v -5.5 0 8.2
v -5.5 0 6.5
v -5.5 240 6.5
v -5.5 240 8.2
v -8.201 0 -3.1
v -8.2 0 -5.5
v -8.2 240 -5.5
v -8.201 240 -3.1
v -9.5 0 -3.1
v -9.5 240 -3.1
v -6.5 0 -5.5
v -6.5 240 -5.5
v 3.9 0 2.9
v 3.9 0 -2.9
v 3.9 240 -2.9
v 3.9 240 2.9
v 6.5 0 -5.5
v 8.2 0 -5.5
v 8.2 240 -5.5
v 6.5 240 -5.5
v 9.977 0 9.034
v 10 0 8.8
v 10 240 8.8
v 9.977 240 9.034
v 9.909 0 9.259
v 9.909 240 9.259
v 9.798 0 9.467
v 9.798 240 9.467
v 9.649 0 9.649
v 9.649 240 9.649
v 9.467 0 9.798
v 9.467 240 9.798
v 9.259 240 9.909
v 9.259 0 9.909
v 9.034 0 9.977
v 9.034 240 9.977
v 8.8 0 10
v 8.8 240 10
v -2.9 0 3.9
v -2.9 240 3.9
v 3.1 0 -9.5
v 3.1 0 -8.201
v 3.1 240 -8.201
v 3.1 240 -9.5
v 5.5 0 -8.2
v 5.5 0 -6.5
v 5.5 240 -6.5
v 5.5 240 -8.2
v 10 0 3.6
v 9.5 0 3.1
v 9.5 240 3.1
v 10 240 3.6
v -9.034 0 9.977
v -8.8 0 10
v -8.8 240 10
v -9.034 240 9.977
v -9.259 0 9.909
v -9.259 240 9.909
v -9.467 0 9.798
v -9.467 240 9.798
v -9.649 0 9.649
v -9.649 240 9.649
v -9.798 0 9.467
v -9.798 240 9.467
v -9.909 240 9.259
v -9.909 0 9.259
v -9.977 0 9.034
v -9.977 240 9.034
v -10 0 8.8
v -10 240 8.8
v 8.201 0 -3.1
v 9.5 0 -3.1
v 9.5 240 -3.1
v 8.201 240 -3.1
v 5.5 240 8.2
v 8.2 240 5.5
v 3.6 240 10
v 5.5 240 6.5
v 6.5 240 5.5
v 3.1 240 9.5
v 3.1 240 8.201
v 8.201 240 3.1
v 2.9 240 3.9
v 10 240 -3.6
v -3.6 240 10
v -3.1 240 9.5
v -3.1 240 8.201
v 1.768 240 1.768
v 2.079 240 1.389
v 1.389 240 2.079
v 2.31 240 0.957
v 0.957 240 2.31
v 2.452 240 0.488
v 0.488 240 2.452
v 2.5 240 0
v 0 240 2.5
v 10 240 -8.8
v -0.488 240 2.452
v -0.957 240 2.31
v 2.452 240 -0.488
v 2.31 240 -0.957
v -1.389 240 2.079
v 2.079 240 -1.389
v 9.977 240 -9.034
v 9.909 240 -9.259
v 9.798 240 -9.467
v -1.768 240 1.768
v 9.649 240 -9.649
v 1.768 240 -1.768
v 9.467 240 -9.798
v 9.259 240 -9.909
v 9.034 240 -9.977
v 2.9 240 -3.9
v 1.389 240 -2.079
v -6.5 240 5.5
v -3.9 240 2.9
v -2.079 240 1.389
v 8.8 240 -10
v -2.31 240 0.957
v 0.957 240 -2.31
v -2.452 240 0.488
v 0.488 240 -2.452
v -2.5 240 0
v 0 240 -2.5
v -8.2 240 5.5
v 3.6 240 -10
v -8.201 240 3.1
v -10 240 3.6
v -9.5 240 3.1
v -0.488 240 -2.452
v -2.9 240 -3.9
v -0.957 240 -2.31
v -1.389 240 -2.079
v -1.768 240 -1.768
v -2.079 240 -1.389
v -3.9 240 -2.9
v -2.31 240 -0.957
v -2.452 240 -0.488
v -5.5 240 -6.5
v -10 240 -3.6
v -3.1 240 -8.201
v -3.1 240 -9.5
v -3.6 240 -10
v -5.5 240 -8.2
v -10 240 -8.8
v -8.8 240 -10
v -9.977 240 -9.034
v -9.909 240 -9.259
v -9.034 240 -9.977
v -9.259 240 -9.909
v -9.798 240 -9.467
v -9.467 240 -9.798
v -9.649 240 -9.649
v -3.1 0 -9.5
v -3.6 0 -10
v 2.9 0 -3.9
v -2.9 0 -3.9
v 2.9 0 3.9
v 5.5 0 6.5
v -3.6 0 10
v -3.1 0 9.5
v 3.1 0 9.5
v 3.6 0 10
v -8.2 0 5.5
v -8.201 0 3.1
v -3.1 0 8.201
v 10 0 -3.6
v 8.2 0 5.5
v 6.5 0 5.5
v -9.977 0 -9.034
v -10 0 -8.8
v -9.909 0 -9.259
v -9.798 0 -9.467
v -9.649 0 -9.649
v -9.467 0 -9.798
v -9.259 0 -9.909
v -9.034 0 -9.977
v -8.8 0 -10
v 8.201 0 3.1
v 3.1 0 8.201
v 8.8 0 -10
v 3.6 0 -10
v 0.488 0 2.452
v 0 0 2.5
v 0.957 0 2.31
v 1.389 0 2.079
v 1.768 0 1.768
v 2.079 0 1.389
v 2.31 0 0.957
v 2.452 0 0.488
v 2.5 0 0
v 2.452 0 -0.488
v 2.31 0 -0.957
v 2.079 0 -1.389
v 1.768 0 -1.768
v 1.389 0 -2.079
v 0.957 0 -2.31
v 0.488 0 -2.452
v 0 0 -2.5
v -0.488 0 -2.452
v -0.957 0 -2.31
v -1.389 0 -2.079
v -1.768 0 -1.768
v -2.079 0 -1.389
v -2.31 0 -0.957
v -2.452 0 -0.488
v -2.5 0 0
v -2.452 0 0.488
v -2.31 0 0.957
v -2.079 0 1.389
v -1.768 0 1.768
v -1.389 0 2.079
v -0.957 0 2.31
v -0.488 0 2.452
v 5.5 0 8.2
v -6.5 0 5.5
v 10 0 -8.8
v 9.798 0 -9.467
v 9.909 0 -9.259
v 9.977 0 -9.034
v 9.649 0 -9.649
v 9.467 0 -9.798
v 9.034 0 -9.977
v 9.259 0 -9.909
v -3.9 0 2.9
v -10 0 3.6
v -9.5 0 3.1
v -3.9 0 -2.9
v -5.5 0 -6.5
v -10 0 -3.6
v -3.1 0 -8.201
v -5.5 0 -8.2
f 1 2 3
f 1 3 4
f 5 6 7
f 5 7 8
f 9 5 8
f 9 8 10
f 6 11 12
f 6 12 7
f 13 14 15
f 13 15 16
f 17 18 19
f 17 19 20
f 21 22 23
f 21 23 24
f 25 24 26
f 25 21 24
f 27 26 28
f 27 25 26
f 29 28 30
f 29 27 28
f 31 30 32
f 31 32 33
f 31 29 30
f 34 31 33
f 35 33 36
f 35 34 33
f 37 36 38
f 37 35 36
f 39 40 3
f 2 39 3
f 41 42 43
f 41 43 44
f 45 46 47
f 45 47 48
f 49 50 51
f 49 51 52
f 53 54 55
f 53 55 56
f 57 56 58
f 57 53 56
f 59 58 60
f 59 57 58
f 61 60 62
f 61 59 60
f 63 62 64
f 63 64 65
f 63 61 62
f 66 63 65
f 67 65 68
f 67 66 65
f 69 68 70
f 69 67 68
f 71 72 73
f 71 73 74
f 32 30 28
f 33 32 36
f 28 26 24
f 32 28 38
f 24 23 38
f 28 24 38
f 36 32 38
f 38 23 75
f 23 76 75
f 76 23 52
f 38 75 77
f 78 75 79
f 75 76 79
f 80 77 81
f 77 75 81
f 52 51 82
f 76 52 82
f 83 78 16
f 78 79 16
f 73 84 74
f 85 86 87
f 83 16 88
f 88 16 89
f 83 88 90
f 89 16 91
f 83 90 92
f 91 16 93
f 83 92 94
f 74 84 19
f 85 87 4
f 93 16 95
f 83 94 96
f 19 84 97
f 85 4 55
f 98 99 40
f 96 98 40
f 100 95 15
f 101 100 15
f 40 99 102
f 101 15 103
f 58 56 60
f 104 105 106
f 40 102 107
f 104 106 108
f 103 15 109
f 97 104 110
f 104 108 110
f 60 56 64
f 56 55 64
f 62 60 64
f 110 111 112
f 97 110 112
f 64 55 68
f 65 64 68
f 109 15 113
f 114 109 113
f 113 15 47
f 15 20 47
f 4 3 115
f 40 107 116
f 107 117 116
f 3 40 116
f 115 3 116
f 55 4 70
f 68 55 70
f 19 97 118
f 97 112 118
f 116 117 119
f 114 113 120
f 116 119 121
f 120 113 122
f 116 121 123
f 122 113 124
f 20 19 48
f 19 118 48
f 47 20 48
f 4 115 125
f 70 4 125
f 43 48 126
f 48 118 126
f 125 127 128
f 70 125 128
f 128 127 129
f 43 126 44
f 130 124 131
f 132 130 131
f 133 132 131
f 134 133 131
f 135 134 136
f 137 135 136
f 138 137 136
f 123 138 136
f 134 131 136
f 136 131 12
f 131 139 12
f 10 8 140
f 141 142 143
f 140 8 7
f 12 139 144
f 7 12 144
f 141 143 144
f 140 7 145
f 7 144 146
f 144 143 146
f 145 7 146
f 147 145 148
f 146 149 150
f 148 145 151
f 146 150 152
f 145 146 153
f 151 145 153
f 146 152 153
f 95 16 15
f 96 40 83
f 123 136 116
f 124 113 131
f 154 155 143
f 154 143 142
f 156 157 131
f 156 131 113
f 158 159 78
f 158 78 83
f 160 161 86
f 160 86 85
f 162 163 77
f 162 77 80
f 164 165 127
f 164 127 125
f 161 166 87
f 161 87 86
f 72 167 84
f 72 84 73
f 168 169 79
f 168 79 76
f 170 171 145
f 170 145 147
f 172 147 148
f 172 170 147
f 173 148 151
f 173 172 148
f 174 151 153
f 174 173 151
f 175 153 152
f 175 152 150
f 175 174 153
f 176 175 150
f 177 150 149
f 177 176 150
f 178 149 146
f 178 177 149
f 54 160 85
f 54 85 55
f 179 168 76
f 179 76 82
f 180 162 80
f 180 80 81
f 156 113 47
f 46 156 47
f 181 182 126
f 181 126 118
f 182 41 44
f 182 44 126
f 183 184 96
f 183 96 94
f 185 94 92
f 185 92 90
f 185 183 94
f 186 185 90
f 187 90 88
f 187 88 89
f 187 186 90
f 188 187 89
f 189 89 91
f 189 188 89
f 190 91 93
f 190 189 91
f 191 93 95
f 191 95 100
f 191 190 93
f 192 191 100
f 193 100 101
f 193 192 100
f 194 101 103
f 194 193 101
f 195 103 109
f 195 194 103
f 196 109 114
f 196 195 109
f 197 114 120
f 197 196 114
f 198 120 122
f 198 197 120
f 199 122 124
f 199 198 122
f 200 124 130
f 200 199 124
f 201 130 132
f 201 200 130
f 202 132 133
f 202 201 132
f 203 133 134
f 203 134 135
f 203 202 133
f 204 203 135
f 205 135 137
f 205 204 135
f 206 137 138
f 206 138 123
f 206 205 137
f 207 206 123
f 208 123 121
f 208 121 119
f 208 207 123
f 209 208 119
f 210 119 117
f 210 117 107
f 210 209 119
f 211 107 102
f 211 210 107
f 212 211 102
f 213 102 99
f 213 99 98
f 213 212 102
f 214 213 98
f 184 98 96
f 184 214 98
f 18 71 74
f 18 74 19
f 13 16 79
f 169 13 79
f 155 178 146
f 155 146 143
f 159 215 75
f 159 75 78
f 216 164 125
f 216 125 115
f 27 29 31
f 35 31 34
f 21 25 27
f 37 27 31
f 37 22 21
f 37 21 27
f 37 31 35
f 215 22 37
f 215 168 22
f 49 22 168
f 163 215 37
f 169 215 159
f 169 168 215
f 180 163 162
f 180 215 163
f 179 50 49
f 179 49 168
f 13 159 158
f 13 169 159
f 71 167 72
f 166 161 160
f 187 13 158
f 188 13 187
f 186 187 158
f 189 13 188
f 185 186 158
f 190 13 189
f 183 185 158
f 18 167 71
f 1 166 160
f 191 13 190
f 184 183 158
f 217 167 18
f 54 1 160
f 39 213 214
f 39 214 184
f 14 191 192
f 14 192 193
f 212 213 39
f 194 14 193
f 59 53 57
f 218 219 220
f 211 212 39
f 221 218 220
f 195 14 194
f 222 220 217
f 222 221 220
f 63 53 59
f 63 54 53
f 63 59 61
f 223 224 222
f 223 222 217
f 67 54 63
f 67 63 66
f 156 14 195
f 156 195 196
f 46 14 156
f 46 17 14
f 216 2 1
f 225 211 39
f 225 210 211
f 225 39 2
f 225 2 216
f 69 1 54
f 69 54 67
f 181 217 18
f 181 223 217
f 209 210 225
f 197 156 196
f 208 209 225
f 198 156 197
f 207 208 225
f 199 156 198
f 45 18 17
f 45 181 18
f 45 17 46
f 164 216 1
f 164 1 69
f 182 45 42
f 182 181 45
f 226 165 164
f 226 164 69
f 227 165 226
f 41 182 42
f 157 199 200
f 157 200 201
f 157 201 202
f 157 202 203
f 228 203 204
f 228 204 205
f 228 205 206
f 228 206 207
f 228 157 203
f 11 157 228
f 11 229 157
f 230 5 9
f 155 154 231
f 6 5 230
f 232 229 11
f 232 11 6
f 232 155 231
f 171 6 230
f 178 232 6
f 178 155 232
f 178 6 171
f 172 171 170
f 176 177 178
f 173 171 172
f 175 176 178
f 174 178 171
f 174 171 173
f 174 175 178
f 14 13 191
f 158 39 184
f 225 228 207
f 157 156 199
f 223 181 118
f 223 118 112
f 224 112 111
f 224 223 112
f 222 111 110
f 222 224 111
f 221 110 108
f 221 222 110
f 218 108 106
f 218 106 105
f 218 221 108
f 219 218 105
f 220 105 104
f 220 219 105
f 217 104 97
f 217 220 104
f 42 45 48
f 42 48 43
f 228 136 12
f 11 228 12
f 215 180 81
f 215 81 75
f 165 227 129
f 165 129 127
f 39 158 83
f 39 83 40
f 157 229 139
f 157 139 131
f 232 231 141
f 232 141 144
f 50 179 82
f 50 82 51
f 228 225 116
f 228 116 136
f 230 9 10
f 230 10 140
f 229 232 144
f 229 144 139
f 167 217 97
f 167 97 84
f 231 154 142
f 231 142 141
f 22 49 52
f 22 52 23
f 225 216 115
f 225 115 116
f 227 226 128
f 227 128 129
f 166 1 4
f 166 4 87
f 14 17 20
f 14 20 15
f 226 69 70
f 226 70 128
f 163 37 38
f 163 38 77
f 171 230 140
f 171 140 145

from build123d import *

# Parameters (mm, degrees)
SKETCH_1_R      = 2.5
EXTRUDE_1_DEPTH = 240


with BuildPart() as part:
    # 草图1 → 凸台-拉伸1 (new body)
    with BuildSketch(Plane(origin=(0, 0, 0), x_dir=(1, 0, 0), z_dir=(0, 1, 0))):
        with BuildLine():
            Line((5.5, 8.2), (3.1, 8.201478584))
            Line((3.1, 8.201478584), (3.1, 9.5))
            Line((3.1, 9.5), (3.6, 10))
            Line((3.6, 10), (8.8, 10))
            ThreePointArc((8.8, 10), (9.648528137, 9.648528137), (10, 8.8))
            Line((10, 8.8), (10, 3.6))
            Line((10, 3.6), (9.5, 3.1))
            Line((9.5, 3.1), (8.201478584, 3.1))
            Line((8.201478584, 3.1), (8.2, 5.5))
            Line((8.2, 5.5), (6.5, 5.5))
            Line((6.5, 5.5), (3.9, 2.9))
            Line((3.9, 2.9), (3.9, -2.9))
            Line((3.9, -2.9), (6.5, -5.5))
            Line((6.5, -5.5), (8.2, -5.5))
            Line((8.2, -5.5), (8.201478584, -3.1))
            Line((8.201478584, -3.1), (9.5, -3.1))
            Line((9.5, -3.1), (10, -3.6))
            Line((10, -3.6), (10, -8.8))
            ThreePointArc((10, -8.8), (9.648528137, -9.648528137), (8.8, -10))
            Line((8.8, -10), (3.6, -10))
            Line((3.6, -10), (3.1, -9.5))
            Line((3.1, -9.5), (3.1, -8.201478584))
            Line((3.1, -8.201478584), (5.5, -8.2))
            Line((5.5, -8.2), (5.5, -6.5))
            Line((5.5, -6.5), (2.9, -3.9))
            Line((2.9, -3.9), (-2.9, -3.9))
            Line((-2.9, -3.9), (-5.5, -6.5))
            Line((-5.5, -6.5), (-5.5, -8.2))
            Line((-5.5, -8.2), (-3.1, -8.201478584))
            Line((-3.1, -8.201478584), (-3.1, -9.5))
            Line((-3.1, -9.5), (-3.6, -10))
            Line((-3.6, -10), (-8.8, -10))
            ThreePointArc((-8.8, -10), (-9.648528137, -9.648528137), (-10, -8.8))
            Line((-10, -8.8), (-10, -3.6))
            Line((-10, -3.6), (-9.5, -3.1))
            Line((-9.5, -3.1), (-8.201478584, -3.1))
            Line((-8.201478584, -3.1), (-8.2, -5.5))
            Line((-8.2, -5.5), (-6.5, -5.5))
            Line((-6.5, -5.5), (-3.9, -2.9))
            Line((-3.9, -2.9), (-3.9, 2.9))
            Line((-3.9, 2.9), (-6.5, 5.5))
            Line((-6.5, 5.5), (-8.2, 5.5))
            Line((-8.2, 5.5), (-8.201478584, 3.1))
            Line((-8.201478584, 3.1), (-9.5, 3.1))
            Line((-9.5, 3.1), (-10, 3.6))
            Line((-10, 3.6), (-10, 8.8))
            ThreePointArc((-10, 8.8), (-9.648528137, 9.648528137), (-8.8, 10))
            Line((-8.8, 10), (-3.6, 10))
            Line((-3.6, 10), (-3.1, 9.5))
            Line((-3.1, 9.5), (-3.1, 8.201478584))
            Line((-3.1, 8.201478584), (-5.5, 8.2))
            Line((-5.5, 8.2), (-5.5, 6.5))
            Line((-5.5, 6.5), (-2.9, 3.9))
            Line((-2.9, 3.9), (2.9, 3.9))
            Line((2.9, 3.9), (5.5, 6.5))
            Line((5.5, 6.5), (5.5, 8.2))
        make_face()
        with Locations(Location((0, 0, 0), (0, 0, 270))):
            Circle(SKETCH_1_R, mode=Mode.SUBTRACT)
    extrude(amount=EXTRUDE_1_DEPTH)


solid = part.part
